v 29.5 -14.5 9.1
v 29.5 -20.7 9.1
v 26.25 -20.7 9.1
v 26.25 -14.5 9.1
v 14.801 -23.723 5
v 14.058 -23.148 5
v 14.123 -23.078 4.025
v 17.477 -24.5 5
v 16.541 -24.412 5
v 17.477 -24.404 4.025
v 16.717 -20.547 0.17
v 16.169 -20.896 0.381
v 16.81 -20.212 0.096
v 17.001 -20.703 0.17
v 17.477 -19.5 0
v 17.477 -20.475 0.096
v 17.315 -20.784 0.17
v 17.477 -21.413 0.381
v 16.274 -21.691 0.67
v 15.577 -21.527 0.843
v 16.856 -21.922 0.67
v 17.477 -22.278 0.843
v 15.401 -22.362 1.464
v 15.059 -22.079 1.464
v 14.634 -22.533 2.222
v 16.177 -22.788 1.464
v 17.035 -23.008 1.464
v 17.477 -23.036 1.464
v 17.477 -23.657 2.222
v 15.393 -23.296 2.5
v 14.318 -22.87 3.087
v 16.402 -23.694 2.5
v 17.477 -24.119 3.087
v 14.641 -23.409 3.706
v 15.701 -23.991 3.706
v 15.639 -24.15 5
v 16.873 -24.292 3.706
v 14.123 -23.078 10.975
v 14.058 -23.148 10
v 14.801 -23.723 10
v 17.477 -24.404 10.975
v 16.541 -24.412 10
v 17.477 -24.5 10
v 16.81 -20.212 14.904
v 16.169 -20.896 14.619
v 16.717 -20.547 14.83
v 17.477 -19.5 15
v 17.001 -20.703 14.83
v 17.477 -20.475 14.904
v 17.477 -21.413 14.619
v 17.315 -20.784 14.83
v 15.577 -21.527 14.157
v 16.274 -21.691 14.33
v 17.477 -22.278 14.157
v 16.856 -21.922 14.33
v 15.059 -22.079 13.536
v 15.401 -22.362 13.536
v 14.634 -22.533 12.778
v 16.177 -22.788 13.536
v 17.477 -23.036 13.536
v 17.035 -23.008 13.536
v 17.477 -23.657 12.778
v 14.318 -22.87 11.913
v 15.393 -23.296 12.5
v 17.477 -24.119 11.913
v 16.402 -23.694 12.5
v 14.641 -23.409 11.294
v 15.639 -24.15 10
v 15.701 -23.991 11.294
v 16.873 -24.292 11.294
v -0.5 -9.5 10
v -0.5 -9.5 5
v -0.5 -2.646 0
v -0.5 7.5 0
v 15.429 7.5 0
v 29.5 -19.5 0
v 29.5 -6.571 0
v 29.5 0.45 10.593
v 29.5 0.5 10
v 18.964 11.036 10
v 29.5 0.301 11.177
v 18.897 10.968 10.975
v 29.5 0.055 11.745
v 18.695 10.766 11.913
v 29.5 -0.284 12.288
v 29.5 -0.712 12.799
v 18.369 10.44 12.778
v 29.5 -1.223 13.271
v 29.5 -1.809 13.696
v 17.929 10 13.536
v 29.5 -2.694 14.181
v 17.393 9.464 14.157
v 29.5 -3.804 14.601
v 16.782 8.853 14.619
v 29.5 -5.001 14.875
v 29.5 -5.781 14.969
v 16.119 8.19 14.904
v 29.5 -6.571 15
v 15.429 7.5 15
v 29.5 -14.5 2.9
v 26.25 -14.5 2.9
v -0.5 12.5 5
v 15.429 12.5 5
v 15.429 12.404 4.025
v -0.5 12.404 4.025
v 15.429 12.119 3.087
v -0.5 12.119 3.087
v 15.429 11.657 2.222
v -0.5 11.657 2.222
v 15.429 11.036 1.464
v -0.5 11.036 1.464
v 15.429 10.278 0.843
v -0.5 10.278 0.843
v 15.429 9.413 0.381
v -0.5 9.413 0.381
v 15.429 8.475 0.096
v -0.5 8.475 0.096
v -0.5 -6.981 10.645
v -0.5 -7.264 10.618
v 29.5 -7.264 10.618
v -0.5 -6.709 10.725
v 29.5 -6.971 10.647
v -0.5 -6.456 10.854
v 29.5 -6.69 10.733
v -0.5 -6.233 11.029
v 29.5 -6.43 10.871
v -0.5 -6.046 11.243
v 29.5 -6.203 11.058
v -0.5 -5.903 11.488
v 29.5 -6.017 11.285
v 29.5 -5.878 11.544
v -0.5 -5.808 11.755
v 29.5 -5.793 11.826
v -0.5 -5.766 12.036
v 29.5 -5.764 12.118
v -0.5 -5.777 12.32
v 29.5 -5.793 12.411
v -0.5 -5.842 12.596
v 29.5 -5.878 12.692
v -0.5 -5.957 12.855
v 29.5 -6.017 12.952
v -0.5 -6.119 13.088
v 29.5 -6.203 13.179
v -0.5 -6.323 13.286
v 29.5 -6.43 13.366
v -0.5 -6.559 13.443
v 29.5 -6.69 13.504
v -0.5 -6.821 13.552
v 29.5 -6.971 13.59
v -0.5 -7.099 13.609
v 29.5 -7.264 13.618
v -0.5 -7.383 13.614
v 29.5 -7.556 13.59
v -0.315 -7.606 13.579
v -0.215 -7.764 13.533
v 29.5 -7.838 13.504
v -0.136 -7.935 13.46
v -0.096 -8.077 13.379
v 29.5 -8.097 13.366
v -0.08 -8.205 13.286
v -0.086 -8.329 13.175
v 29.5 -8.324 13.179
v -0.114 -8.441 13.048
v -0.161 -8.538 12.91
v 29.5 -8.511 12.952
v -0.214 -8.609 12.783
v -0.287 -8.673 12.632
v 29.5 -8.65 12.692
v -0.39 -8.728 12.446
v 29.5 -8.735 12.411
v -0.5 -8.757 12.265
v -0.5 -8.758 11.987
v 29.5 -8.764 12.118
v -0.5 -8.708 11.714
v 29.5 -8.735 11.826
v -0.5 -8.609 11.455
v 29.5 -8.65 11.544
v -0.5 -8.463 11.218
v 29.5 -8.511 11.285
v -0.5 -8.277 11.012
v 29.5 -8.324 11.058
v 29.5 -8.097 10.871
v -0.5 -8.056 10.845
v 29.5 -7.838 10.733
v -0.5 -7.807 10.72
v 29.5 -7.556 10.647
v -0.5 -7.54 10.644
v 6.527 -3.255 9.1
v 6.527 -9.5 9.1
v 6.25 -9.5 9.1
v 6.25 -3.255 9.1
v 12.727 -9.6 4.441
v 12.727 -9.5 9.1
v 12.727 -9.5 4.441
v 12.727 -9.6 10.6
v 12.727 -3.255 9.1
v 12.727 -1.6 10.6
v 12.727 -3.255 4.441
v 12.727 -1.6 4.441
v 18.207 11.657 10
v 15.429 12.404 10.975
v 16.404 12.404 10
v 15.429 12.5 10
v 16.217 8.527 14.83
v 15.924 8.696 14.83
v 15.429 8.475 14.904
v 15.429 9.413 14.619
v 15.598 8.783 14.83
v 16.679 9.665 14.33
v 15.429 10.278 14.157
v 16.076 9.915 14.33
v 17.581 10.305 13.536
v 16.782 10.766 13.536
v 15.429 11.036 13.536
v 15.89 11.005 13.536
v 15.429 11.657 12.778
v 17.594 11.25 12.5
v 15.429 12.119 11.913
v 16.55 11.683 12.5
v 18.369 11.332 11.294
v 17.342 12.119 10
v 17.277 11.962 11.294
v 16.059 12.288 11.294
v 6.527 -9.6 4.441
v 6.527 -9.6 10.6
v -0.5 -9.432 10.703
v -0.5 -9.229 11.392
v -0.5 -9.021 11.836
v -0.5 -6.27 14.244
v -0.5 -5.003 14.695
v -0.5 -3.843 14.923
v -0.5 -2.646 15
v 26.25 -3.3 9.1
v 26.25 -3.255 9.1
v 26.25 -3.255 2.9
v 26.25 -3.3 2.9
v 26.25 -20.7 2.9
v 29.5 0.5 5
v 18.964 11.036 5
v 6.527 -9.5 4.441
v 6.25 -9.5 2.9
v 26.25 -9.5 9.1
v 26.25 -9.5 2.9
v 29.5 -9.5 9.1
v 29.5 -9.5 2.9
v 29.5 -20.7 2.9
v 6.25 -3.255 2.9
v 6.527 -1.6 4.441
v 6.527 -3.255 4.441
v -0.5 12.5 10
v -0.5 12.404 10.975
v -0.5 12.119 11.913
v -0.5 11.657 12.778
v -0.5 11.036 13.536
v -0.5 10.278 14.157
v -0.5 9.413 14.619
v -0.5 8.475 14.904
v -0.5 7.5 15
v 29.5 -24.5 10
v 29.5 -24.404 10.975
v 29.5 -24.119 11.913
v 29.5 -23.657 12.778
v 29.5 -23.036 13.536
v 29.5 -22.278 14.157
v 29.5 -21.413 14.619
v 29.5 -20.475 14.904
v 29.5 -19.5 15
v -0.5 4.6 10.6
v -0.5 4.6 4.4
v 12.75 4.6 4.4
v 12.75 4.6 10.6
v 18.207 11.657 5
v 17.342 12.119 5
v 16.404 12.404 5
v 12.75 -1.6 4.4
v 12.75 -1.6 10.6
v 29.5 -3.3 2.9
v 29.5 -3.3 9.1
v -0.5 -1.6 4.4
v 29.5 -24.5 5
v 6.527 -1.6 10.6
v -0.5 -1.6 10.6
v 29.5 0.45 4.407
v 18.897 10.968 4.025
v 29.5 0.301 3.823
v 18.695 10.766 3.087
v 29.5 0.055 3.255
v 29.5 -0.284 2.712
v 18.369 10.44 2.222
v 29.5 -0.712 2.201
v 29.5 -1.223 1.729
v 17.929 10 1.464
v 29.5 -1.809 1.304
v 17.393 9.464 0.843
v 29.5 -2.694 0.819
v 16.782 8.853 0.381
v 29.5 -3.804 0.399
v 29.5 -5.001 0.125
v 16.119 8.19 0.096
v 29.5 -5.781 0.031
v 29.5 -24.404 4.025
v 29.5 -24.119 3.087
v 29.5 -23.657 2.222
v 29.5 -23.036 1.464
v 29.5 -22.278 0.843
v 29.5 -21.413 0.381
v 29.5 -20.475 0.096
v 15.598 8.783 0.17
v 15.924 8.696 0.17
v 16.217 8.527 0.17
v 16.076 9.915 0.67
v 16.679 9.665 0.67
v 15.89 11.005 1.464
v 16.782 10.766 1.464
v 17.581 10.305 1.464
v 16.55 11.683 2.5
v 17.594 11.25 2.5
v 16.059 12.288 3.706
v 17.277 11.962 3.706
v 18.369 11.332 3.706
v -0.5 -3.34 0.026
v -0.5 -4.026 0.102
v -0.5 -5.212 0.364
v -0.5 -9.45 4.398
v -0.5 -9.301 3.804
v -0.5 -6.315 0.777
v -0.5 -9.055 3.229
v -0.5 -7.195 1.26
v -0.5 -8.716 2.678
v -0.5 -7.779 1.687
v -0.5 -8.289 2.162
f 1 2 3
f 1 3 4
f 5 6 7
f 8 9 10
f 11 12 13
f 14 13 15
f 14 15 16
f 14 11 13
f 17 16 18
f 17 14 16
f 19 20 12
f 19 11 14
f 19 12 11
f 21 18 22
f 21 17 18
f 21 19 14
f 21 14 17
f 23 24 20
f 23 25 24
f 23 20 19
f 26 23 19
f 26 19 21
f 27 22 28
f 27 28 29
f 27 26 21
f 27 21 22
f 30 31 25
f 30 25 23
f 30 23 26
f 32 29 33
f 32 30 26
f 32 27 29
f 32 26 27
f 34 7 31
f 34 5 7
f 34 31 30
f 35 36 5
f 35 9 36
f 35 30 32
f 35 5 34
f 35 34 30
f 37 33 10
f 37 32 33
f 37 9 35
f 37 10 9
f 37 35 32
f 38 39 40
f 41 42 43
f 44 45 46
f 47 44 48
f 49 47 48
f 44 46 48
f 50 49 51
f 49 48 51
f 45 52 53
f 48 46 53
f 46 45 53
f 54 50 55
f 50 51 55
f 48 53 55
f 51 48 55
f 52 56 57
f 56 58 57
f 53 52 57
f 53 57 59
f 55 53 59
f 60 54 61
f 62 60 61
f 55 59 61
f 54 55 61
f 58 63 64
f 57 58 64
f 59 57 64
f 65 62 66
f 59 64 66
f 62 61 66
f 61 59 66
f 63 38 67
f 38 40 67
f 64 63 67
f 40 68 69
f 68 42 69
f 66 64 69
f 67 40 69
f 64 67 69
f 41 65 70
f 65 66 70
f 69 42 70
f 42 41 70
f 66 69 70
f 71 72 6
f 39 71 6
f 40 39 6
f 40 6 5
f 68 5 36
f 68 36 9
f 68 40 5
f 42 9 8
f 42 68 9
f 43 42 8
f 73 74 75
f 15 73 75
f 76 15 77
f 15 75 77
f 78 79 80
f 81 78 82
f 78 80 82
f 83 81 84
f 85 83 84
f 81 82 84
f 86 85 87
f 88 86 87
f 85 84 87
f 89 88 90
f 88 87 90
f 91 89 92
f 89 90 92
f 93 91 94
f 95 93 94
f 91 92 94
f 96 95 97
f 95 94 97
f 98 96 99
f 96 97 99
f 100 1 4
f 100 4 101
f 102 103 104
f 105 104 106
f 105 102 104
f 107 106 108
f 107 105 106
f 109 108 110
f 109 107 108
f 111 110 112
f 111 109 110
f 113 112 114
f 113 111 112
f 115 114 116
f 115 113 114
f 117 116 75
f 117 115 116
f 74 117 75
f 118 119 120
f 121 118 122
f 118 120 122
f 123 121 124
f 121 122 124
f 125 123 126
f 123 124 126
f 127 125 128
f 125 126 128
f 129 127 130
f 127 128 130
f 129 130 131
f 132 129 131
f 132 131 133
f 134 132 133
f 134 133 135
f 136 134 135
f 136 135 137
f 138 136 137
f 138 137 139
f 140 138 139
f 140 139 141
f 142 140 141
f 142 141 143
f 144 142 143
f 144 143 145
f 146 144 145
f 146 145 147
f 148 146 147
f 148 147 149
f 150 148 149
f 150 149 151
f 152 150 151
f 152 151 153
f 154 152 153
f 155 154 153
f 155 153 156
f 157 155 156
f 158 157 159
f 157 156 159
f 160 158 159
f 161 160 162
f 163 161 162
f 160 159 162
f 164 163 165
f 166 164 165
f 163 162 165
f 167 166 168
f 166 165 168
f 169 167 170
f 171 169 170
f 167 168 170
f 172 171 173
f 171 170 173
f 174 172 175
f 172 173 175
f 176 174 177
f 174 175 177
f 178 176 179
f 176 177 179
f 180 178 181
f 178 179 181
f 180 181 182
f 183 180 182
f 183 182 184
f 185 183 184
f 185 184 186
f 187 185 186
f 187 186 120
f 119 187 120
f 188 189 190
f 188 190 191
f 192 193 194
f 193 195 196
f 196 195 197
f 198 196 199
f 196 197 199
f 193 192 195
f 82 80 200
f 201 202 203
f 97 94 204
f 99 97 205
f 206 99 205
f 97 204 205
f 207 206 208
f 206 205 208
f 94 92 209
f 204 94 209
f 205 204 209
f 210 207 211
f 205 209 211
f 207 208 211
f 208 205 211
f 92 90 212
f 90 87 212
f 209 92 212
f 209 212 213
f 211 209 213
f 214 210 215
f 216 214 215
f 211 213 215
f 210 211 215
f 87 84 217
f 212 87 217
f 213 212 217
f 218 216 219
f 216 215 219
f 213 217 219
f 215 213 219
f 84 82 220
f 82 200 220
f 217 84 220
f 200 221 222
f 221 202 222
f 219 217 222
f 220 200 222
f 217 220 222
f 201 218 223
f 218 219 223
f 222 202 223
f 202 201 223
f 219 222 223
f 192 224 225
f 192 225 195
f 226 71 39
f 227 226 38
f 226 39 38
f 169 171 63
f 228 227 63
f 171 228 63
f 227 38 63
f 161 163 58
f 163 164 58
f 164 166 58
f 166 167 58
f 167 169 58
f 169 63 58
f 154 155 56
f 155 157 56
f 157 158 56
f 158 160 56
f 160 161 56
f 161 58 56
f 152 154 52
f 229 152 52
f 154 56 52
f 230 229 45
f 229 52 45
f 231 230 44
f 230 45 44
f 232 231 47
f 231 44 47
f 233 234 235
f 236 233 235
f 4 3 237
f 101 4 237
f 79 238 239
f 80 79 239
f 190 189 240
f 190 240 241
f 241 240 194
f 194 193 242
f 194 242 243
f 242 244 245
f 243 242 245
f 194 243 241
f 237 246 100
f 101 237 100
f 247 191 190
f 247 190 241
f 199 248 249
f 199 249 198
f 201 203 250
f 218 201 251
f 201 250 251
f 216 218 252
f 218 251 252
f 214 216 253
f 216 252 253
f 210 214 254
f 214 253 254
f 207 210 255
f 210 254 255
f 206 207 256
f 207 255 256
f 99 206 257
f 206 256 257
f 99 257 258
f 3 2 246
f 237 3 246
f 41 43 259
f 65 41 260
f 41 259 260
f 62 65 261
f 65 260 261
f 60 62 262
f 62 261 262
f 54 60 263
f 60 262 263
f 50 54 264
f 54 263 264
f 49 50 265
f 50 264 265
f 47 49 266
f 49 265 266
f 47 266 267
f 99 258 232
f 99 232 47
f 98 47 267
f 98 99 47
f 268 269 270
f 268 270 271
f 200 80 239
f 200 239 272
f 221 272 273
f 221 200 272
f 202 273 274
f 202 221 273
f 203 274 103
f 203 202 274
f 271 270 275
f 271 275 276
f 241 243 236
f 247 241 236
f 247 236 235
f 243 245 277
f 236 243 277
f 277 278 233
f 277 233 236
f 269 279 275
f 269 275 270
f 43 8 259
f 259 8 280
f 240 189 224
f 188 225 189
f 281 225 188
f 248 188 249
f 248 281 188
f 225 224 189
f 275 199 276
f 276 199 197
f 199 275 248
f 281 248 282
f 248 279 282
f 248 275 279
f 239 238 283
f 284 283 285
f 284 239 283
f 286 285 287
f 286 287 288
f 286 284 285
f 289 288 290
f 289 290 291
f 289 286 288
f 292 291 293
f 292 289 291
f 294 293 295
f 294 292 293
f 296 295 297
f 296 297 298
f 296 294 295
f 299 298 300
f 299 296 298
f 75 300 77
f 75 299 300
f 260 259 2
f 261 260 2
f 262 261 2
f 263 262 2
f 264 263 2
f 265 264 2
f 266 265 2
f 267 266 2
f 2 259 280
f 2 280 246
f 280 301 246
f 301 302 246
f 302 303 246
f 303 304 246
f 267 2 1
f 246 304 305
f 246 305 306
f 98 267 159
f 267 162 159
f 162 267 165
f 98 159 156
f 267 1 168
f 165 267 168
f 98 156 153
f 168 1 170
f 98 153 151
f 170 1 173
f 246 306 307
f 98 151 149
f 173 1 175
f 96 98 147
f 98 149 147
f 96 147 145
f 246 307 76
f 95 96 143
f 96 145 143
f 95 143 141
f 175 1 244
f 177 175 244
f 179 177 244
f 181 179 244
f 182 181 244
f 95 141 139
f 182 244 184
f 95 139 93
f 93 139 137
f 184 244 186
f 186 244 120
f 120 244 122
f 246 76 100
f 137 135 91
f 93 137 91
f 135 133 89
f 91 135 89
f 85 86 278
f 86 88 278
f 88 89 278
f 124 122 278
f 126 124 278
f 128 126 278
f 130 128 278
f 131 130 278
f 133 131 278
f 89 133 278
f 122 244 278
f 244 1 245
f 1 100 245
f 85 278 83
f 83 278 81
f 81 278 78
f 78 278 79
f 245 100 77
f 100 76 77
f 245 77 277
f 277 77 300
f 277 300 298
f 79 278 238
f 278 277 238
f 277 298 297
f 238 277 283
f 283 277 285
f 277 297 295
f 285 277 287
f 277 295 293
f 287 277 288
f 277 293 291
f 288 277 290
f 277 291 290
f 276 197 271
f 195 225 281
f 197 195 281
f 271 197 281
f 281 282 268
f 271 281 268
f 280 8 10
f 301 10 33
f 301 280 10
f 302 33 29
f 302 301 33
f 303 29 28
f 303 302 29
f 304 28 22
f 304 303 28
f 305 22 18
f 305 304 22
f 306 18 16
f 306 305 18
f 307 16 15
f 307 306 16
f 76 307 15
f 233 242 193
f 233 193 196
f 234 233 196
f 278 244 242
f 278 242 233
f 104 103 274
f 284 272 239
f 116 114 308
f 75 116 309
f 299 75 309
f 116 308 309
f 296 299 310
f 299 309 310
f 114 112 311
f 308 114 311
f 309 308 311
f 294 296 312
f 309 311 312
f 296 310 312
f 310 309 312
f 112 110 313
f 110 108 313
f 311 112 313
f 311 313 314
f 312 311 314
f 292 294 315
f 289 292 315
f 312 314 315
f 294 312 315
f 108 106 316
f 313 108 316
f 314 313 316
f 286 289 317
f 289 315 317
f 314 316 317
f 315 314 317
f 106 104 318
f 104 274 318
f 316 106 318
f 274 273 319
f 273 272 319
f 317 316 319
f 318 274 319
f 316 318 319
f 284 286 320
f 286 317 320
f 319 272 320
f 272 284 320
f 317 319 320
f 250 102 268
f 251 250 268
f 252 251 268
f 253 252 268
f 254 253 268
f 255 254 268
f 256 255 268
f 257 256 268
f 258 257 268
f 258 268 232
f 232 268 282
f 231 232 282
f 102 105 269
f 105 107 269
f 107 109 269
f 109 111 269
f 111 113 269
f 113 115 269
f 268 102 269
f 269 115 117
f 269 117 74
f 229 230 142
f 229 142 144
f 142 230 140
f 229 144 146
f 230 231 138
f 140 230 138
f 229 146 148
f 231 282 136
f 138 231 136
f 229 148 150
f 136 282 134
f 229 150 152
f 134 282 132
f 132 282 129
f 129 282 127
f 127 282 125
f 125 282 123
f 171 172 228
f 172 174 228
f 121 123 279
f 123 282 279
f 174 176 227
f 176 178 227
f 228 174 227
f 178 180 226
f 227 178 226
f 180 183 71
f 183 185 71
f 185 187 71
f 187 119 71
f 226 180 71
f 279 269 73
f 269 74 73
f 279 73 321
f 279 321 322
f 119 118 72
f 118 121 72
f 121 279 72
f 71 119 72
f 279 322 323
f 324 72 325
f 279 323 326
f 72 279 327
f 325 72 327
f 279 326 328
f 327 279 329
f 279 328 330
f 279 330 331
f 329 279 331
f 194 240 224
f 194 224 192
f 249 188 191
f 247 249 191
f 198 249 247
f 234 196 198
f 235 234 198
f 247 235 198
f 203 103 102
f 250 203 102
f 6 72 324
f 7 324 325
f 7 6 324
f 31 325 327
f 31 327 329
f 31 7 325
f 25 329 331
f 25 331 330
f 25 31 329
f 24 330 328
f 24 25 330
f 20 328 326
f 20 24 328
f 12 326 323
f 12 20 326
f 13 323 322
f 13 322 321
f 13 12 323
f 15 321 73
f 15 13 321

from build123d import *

# Parameters (mm, degrees)
BOSS_EXTRUDE1_DEPTH = 15
FILLET1_R           = 5
SKETCH4_W           = 6.2
SKETCH4_H           = 6.2
CUT_EXTRUDE1_DEPTH  = 3.25
SKETCH5_W           = 6.2
SKETCH5_H           = 6.2
CUT_EXTRUDE2_DEPTH  = 3.25
SKETCH8_W           = 6.2
SKETCH8_H           = 6.2
CUT_EXTRUDE3_DEPTH  = 10
SKETCH9_W           = 6.2
SKETCH9_H           = 6.158762439
CUT_EXTRUDE4_DEPTH  = 8
SKETCH10_W          = 6.2
SKETCH10_H          = 6.244686175
CUT_EXTRUDE6_DEPTH  = 20
SKETCH11_R          = 1.5
CUT_EXTRUDE7_DEPTH  = 36


with BuildPart() as part:
    # Sketch2 → Boss-Extrude1 (new body)
    with BuildSketch(Plane.XY):
        Polygon((29.5, -24.5), (29.5, 0.5), (17.5, 12.5), (-0.5, 12.5), (-0.5, -9.5), (15.5, -24.5), align=None)
    extrude(amount=BOSS_EXTRUDE1_DEPTH)

    # Fillet1
    fillet1_edges = [part.edges().sort_by_distance(p)[0] for p in [
        (15.5, -24.5, 7.5),
        (17.5, 12.5, 7.5),
        (23.5, 6.5, 15),
        (8.5, 12.5, 15),
        (7.5, -17, 15),
        (22.5, -24.5, 15),
        (7.5, -17, 0),
        (8.5, 12.5, 0),
        (23.5, 6.5, 0),
        (22.5, -24.5, 0),
    ]]
    fillet(fillet1_edges, radius=FILLET1_R)

    # Sketch4 → Cut-Extrude1 (cut)
    with BuildSketch(Plane(origin=(29.5, 0, 0), x_dir=(0, 0, -1), z_dir=(1, 0, 0))):
        with Locations((-6, -17.6)):
            Rectangle(SKETCH4_W, SKETCH4_H)
        with Locations((-6, -6.4)):
            Rectangle(SKETCH4_W, SKETCH4_H)
    extrude(amount=-CUT_EXTRUDE1_DEPTH, mode=Mode.SUBTRACT)

    # Sketch5 → Cut-Extrude2 (cut)
    with BuildSketch(Plane.ZY.offset(0.5)):
        with Locations((7.5, 1.5)):
            Rectangle(SKETCH5_W, SKETCH5_H)
    extrude(amount=-CUT_EXTRUDE2_DEPTH, mode=Mode.SUBTRACT)

    # Sketch8 → Cut-Extrude3 (cut)
    with BuildSketch(Plane.ZY.offset(-2.75)):
        with Locations((7.5, 1.5)):
            Rectangle(SKETCH8_W, SKETCH8_H)
    extrude(amount=-CUT_EXTRUDE3_DEPTH, mode=Mode.SUBTRACT)

    # Sketch9 → Cut-Extrude4 (cut)
    with BuildSketch(Plane(origin=(0, -1.6, 0), x_dir=(1, 0, 0), z_dir=(0, 1, 0))):
        with Locations((9.626788027, -7.520618781)):
            Rectangle(SKETCH9_W, SKETCH9_H)
    extrude(amount=-CUT_EXTRUDE4_DEPTH, mode=Mode.SUBTRACT)

    # Sketch10 → Cut-Extrude6 (cut)
    with BuildSketch(Plane(origin=(26.25, 0, 0), x_dir=(0, 0, -1), z_dir=(1, 0, 0))):
        with Locations((-6, -6.377656912)):
            Rectangle(SKETCH10_W, SKETCH10_H)
    extrude(amount=-CUT_EXTRUDE6_DEPTH, mode=Mode.SUBTRACT)

    # Sketch11 → Cut-Extrude7 (cut)
    with BuildSketch(Plane(origin=(29.5, 0, 0), x_dir=(0, 0, -1), z_dir=(1, 0, 0))):
        with Locations((-12.118468993, -7.263784025)):
            Circle(SKETCH11_R)
    extrude(amount=-CUT_EXTRUDE7_DEPTH, mode=Mode.SUBTRACT)


solid = part.part
